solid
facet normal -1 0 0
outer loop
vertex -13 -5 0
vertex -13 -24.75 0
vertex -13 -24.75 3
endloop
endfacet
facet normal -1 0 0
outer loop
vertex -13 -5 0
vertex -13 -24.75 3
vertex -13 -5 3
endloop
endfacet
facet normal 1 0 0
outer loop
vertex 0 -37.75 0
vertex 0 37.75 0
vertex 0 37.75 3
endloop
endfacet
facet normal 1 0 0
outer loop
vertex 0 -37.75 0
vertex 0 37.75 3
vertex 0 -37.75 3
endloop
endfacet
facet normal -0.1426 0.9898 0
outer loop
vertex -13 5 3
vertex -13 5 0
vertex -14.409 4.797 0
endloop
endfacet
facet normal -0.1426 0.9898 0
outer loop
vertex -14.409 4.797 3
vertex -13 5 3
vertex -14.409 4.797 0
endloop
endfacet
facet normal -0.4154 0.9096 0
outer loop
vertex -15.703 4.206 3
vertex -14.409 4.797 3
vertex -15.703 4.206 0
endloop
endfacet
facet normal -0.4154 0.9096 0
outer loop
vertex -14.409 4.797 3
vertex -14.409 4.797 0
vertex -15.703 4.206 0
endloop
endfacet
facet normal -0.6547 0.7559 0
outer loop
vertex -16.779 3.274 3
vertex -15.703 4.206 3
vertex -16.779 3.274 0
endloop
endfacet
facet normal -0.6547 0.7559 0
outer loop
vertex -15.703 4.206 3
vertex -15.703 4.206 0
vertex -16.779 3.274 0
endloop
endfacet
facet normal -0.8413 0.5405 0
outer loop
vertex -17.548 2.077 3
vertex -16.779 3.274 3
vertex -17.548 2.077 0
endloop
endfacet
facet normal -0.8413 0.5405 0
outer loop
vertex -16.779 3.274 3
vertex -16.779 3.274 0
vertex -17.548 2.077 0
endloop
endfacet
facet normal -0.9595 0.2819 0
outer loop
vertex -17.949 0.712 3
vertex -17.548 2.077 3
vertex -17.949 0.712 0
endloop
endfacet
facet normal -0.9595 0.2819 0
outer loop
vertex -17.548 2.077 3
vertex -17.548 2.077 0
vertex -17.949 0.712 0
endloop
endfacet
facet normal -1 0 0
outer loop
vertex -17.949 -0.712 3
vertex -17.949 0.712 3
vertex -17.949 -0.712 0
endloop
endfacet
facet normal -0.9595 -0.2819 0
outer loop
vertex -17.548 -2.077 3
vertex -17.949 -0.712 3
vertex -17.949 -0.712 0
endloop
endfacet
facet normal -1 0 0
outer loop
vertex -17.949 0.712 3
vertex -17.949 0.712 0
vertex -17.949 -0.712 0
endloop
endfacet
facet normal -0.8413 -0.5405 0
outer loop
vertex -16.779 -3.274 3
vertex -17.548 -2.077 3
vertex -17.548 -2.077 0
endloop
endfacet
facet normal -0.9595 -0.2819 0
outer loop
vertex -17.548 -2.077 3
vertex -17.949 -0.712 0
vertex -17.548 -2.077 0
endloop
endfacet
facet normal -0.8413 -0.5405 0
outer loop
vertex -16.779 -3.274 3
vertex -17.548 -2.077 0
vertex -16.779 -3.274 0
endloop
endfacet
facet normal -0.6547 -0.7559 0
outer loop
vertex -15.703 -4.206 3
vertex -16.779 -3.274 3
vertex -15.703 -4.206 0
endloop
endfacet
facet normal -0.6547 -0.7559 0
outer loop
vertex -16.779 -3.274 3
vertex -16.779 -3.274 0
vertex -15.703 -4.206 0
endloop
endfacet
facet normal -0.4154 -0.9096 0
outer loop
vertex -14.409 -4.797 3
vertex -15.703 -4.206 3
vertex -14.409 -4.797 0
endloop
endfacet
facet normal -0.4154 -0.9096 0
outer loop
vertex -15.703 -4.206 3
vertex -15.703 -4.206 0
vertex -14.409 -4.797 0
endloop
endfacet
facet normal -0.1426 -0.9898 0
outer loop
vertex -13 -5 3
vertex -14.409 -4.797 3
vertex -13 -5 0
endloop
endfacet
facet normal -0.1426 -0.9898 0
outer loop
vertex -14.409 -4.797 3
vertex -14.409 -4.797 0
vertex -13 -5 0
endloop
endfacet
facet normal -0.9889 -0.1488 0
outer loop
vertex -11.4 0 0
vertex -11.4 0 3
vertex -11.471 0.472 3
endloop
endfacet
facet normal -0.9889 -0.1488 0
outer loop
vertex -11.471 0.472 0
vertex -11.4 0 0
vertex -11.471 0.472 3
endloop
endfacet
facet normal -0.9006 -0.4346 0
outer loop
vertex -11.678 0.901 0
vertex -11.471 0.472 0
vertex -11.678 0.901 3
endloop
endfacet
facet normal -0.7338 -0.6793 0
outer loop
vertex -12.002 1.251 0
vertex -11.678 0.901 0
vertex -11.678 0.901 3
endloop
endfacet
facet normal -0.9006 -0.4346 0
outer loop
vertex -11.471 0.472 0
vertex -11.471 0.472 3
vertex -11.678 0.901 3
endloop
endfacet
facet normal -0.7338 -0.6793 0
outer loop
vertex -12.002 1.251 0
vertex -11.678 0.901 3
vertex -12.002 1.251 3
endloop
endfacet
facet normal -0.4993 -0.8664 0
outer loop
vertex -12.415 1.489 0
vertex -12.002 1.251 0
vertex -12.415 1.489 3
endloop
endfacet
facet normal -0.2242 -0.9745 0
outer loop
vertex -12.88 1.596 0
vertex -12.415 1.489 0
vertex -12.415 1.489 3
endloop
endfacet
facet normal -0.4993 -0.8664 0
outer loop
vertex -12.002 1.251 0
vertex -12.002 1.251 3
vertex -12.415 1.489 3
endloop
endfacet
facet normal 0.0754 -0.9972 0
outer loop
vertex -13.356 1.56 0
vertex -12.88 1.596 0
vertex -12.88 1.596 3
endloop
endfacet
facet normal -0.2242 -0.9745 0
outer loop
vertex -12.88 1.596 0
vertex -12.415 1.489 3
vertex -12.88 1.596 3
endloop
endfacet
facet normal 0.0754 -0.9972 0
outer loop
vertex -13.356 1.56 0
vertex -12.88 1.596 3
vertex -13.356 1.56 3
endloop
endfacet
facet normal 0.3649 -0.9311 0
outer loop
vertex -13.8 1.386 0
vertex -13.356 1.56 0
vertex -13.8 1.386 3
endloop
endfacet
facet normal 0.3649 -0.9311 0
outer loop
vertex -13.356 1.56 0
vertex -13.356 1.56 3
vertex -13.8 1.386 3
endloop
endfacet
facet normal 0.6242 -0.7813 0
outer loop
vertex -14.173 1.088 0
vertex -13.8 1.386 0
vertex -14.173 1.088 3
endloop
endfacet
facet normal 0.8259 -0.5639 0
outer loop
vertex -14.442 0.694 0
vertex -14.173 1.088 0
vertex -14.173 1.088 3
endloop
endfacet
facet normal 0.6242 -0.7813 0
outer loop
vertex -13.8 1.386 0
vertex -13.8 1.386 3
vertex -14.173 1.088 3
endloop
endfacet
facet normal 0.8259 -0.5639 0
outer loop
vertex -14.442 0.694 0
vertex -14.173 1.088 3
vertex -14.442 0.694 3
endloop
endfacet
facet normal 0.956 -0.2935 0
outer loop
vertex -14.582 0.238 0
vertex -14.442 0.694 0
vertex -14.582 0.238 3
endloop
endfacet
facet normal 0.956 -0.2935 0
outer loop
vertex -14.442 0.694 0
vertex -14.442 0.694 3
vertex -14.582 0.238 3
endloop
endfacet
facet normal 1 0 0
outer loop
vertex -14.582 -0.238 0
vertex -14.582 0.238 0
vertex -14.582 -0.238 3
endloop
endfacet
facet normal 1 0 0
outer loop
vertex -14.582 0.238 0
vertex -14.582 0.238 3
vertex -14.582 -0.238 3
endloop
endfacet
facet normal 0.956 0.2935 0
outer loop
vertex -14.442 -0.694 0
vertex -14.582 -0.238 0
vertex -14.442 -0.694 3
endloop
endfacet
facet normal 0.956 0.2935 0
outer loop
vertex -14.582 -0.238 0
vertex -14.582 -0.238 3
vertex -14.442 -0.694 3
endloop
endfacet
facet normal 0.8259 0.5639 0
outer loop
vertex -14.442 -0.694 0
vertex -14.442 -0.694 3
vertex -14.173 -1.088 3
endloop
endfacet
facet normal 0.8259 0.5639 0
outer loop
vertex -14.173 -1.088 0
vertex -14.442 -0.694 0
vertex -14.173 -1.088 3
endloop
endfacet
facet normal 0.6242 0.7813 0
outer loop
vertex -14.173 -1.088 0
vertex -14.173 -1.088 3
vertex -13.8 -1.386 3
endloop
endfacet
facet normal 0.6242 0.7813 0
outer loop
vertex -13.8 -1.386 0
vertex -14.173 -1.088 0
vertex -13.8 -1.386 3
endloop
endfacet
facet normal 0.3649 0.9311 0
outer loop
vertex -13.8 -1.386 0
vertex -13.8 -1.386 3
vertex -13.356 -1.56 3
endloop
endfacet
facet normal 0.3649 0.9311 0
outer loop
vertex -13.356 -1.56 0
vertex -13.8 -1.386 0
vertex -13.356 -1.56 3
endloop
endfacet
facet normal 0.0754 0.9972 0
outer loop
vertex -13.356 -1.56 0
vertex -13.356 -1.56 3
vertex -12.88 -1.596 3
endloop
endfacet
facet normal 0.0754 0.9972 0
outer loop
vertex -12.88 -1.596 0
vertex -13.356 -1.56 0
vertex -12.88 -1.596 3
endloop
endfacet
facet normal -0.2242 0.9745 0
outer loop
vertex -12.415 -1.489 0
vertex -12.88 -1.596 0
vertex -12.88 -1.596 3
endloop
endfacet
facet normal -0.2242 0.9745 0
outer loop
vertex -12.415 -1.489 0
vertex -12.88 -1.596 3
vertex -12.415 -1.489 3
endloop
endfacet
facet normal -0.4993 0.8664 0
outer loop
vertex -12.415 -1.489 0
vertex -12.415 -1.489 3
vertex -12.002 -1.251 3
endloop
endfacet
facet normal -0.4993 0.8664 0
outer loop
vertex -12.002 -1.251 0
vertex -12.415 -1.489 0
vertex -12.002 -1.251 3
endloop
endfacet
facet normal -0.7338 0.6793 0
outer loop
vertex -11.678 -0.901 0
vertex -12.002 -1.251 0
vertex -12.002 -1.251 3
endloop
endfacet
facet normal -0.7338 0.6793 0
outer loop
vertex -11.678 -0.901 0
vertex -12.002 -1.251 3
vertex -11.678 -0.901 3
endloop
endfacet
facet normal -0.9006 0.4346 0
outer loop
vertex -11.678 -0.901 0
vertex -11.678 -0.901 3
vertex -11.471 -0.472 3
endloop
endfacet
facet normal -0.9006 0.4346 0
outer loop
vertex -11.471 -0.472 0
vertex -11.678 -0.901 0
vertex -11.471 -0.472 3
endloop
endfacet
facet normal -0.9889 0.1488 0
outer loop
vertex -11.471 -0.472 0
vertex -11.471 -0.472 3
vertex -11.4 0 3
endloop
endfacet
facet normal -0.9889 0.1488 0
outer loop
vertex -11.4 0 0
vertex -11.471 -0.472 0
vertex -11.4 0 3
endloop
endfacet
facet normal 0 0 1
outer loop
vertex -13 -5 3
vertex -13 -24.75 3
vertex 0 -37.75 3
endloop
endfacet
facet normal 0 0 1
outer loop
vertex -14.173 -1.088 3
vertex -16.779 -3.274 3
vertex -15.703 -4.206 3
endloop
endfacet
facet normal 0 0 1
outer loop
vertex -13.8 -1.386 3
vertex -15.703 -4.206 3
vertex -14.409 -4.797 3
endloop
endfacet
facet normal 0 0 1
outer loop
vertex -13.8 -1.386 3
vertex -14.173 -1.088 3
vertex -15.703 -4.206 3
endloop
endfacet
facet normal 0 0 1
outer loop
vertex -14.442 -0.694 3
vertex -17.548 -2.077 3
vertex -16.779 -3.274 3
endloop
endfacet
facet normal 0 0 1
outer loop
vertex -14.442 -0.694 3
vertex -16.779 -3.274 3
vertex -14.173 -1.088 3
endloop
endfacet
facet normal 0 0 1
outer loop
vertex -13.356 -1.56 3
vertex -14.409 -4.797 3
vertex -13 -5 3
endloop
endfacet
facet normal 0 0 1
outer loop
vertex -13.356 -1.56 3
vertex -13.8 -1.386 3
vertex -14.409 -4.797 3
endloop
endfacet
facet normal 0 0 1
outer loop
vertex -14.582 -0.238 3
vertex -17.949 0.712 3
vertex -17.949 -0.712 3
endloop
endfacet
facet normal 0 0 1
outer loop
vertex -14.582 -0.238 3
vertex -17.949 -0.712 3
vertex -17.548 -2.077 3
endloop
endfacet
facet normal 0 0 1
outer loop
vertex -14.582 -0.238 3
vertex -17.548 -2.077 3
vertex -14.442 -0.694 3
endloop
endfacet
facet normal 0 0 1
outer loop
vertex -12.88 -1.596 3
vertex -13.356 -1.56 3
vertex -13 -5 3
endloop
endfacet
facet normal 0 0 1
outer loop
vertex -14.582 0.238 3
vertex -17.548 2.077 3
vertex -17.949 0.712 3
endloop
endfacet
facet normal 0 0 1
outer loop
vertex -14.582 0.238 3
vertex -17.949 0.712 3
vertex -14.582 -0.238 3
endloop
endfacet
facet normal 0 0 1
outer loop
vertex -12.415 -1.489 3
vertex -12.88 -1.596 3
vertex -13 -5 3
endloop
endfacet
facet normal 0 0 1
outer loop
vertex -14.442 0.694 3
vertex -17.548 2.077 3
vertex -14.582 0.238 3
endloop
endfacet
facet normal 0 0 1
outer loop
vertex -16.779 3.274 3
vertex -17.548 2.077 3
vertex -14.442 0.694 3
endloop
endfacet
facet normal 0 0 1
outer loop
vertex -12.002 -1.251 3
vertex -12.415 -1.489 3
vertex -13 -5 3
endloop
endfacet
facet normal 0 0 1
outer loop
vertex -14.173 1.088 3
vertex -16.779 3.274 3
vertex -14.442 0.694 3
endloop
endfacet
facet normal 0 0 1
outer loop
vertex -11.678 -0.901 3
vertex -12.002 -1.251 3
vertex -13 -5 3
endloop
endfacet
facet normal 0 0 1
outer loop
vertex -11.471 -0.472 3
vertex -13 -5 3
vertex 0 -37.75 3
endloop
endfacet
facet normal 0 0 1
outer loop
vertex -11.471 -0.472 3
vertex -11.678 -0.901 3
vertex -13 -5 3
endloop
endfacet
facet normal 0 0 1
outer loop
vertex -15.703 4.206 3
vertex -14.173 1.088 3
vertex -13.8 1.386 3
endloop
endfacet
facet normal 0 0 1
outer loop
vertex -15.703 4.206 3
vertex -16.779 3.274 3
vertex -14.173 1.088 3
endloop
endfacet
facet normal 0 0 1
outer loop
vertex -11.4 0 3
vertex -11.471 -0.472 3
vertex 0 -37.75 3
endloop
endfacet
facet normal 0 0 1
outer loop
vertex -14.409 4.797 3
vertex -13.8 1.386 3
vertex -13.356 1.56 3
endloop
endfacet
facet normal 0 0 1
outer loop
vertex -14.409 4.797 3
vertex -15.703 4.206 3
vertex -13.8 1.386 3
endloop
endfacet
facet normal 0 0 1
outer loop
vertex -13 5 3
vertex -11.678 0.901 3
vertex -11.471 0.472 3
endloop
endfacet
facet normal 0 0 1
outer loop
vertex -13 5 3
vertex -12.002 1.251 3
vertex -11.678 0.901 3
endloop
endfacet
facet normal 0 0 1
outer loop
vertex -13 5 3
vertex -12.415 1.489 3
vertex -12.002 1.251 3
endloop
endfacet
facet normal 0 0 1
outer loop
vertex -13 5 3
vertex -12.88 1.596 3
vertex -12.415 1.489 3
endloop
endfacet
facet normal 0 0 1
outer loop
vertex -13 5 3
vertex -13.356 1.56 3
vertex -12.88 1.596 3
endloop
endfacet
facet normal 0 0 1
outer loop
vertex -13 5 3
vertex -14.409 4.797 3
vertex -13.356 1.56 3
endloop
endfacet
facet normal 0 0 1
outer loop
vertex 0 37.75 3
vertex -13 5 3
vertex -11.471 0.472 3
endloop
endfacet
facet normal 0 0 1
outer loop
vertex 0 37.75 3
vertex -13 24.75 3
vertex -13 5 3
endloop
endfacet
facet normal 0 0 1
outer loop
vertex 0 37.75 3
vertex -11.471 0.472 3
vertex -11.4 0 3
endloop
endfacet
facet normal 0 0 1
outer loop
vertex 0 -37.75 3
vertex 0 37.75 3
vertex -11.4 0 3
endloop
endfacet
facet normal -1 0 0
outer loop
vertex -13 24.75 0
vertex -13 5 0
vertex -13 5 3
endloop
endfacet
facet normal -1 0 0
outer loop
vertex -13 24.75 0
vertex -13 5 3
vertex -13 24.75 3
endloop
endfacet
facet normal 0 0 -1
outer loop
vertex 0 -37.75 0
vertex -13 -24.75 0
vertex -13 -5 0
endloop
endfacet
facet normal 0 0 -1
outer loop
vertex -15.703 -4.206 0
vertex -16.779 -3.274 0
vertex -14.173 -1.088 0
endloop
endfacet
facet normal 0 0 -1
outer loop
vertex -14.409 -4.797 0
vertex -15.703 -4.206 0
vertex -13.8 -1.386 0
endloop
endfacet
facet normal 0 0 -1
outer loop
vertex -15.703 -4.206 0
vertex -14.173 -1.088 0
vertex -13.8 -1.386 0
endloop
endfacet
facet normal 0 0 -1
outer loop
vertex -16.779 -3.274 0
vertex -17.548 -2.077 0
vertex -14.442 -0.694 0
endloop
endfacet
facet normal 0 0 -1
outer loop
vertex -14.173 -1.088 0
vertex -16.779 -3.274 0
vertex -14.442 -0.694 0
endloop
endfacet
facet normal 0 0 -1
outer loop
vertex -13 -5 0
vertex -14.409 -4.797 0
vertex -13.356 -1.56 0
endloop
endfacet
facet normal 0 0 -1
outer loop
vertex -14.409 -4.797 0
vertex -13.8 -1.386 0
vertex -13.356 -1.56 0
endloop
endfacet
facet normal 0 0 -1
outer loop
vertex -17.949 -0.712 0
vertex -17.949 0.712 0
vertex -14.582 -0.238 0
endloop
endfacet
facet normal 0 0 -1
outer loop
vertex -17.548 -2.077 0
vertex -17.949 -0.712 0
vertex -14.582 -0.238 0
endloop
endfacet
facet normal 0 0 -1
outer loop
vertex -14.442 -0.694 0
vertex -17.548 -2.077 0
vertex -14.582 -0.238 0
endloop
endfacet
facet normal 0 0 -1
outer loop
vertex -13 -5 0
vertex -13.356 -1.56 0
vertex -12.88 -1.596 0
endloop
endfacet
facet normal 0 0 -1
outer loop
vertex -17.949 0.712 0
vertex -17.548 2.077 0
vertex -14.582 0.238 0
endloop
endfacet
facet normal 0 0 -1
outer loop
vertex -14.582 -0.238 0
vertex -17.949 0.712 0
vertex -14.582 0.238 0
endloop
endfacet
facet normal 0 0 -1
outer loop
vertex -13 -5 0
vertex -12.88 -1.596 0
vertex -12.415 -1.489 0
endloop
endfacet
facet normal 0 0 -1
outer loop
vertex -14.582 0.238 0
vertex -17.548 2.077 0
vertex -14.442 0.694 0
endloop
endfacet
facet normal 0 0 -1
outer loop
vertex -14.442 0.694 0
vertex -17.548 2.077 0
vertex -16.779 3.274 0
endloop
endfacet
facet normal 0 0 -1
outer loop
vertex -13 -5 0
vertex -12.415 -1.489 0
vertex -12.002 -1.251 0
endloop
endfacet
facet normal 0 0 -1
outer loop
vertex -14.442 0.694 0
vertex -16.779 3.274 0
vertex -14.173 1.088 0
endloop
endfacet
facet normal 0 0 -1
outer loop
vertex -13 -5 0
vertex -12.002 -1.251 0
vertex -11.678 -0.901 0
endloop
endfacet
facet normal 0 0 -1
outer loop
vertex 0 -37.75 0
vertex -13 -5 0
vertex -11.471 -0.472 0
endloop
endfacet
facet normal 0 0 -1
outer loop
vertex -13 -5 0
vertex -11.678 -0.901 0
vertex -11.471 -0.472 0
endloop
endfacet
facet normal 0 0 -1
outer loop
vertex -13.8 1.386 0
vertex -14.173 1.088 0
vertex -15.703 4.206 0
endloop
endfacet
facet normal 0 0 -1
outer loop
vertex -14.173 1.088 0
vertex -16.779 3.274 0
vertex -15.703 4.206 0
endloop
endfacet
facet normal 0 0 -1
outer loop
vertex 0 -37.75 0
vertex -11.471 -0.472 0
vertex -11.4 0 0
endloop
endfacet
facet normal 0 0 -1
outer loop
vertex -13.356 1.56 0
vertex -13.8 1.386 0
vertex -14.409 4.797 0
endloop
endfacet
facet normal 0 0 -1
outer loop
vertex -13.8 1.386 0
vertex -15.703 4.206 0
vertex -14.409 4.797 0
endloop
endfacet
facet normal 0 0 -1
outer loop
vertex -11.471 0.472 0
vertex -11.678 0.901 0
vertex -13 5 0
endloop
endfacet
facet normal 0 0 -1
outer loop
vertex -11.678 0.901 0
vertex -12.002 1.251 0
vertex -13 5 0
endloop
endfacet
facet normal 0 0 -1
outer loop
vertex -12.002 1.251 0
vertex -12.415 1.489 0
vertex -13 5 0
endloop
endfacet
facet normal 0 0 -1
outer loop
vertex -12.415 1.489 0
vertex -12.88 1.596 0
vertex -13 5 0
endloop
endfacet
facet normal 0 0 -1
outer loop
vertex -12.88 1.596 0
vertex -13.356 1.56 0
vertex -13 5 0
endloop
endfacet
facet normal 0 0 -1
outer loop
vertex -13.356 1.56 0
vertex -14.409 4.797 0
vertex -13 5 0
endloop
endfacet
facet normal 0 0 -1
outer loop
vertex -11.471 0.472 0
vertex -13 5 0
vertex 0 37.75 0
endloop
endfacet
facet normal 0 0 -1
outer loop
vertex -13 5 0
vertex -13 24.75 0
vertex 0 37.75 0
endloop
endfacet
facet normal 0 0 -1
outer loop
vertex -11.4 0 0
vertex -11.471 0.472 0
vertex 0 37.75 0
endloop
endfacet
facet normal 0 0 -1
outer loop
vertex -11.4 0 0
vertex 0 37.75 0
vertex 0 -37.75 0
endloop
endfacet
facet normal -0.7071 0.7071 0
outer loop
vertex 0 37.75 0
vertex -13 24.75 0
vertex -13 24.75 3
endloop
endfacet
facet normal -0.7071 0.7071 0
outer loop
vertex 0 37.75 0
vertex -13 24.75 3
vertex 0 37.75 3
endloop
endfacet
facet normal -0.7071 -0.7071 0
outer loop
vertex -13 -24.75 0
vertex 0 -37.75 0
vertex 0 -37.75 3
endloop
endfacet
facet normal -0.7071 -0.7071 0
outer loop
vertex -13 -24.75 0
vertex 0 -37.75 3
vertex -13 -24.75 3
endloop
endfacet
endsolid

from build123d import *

# Parameters (mm, degrees)
SKETCH1_R           = 5
BOSS_EXTRUDE1_DEPTH = 3
CUT_EXTRUDE1_REACH  = 43.929
SKETCH2_R           = 1.6


with BuildPart() as part:
    # Sketch1 → Boss-Extrude1 (new body)
    with BuildSketch(Plane.XY):
        with Locations((-13, 0)):
            Circle(SKETCH1_R)
        Polygon((-13, -24.75), (-13, 24.75), (0, 37.75), (0, -37.75), align=None)
    extrude(amount=BOSS_EXTRUDE1_DEPTH)

    # Sketch2 → Cut-Extrude1 (cut, up to next)
    with BuildSketch(Plane.XY.offset(3), mode=Mode.PRIVATE) as cut_extrude1_sk1:
        with Locations((-13, 0)):
            Circle(SKETCH2_R)
    cut_extrude1_tool1 = extrude(cut_extrude1_sk1.sketch, amount=-CUT_EXTRUDE1_REACH, mode=Mode.PRIVATE) & part.part
    add(cut_extrude1_tool1.solids().sort_by_distance((-13, 0, 3))[0], mode=Mode.SUBTRACT)


solid = part.part
